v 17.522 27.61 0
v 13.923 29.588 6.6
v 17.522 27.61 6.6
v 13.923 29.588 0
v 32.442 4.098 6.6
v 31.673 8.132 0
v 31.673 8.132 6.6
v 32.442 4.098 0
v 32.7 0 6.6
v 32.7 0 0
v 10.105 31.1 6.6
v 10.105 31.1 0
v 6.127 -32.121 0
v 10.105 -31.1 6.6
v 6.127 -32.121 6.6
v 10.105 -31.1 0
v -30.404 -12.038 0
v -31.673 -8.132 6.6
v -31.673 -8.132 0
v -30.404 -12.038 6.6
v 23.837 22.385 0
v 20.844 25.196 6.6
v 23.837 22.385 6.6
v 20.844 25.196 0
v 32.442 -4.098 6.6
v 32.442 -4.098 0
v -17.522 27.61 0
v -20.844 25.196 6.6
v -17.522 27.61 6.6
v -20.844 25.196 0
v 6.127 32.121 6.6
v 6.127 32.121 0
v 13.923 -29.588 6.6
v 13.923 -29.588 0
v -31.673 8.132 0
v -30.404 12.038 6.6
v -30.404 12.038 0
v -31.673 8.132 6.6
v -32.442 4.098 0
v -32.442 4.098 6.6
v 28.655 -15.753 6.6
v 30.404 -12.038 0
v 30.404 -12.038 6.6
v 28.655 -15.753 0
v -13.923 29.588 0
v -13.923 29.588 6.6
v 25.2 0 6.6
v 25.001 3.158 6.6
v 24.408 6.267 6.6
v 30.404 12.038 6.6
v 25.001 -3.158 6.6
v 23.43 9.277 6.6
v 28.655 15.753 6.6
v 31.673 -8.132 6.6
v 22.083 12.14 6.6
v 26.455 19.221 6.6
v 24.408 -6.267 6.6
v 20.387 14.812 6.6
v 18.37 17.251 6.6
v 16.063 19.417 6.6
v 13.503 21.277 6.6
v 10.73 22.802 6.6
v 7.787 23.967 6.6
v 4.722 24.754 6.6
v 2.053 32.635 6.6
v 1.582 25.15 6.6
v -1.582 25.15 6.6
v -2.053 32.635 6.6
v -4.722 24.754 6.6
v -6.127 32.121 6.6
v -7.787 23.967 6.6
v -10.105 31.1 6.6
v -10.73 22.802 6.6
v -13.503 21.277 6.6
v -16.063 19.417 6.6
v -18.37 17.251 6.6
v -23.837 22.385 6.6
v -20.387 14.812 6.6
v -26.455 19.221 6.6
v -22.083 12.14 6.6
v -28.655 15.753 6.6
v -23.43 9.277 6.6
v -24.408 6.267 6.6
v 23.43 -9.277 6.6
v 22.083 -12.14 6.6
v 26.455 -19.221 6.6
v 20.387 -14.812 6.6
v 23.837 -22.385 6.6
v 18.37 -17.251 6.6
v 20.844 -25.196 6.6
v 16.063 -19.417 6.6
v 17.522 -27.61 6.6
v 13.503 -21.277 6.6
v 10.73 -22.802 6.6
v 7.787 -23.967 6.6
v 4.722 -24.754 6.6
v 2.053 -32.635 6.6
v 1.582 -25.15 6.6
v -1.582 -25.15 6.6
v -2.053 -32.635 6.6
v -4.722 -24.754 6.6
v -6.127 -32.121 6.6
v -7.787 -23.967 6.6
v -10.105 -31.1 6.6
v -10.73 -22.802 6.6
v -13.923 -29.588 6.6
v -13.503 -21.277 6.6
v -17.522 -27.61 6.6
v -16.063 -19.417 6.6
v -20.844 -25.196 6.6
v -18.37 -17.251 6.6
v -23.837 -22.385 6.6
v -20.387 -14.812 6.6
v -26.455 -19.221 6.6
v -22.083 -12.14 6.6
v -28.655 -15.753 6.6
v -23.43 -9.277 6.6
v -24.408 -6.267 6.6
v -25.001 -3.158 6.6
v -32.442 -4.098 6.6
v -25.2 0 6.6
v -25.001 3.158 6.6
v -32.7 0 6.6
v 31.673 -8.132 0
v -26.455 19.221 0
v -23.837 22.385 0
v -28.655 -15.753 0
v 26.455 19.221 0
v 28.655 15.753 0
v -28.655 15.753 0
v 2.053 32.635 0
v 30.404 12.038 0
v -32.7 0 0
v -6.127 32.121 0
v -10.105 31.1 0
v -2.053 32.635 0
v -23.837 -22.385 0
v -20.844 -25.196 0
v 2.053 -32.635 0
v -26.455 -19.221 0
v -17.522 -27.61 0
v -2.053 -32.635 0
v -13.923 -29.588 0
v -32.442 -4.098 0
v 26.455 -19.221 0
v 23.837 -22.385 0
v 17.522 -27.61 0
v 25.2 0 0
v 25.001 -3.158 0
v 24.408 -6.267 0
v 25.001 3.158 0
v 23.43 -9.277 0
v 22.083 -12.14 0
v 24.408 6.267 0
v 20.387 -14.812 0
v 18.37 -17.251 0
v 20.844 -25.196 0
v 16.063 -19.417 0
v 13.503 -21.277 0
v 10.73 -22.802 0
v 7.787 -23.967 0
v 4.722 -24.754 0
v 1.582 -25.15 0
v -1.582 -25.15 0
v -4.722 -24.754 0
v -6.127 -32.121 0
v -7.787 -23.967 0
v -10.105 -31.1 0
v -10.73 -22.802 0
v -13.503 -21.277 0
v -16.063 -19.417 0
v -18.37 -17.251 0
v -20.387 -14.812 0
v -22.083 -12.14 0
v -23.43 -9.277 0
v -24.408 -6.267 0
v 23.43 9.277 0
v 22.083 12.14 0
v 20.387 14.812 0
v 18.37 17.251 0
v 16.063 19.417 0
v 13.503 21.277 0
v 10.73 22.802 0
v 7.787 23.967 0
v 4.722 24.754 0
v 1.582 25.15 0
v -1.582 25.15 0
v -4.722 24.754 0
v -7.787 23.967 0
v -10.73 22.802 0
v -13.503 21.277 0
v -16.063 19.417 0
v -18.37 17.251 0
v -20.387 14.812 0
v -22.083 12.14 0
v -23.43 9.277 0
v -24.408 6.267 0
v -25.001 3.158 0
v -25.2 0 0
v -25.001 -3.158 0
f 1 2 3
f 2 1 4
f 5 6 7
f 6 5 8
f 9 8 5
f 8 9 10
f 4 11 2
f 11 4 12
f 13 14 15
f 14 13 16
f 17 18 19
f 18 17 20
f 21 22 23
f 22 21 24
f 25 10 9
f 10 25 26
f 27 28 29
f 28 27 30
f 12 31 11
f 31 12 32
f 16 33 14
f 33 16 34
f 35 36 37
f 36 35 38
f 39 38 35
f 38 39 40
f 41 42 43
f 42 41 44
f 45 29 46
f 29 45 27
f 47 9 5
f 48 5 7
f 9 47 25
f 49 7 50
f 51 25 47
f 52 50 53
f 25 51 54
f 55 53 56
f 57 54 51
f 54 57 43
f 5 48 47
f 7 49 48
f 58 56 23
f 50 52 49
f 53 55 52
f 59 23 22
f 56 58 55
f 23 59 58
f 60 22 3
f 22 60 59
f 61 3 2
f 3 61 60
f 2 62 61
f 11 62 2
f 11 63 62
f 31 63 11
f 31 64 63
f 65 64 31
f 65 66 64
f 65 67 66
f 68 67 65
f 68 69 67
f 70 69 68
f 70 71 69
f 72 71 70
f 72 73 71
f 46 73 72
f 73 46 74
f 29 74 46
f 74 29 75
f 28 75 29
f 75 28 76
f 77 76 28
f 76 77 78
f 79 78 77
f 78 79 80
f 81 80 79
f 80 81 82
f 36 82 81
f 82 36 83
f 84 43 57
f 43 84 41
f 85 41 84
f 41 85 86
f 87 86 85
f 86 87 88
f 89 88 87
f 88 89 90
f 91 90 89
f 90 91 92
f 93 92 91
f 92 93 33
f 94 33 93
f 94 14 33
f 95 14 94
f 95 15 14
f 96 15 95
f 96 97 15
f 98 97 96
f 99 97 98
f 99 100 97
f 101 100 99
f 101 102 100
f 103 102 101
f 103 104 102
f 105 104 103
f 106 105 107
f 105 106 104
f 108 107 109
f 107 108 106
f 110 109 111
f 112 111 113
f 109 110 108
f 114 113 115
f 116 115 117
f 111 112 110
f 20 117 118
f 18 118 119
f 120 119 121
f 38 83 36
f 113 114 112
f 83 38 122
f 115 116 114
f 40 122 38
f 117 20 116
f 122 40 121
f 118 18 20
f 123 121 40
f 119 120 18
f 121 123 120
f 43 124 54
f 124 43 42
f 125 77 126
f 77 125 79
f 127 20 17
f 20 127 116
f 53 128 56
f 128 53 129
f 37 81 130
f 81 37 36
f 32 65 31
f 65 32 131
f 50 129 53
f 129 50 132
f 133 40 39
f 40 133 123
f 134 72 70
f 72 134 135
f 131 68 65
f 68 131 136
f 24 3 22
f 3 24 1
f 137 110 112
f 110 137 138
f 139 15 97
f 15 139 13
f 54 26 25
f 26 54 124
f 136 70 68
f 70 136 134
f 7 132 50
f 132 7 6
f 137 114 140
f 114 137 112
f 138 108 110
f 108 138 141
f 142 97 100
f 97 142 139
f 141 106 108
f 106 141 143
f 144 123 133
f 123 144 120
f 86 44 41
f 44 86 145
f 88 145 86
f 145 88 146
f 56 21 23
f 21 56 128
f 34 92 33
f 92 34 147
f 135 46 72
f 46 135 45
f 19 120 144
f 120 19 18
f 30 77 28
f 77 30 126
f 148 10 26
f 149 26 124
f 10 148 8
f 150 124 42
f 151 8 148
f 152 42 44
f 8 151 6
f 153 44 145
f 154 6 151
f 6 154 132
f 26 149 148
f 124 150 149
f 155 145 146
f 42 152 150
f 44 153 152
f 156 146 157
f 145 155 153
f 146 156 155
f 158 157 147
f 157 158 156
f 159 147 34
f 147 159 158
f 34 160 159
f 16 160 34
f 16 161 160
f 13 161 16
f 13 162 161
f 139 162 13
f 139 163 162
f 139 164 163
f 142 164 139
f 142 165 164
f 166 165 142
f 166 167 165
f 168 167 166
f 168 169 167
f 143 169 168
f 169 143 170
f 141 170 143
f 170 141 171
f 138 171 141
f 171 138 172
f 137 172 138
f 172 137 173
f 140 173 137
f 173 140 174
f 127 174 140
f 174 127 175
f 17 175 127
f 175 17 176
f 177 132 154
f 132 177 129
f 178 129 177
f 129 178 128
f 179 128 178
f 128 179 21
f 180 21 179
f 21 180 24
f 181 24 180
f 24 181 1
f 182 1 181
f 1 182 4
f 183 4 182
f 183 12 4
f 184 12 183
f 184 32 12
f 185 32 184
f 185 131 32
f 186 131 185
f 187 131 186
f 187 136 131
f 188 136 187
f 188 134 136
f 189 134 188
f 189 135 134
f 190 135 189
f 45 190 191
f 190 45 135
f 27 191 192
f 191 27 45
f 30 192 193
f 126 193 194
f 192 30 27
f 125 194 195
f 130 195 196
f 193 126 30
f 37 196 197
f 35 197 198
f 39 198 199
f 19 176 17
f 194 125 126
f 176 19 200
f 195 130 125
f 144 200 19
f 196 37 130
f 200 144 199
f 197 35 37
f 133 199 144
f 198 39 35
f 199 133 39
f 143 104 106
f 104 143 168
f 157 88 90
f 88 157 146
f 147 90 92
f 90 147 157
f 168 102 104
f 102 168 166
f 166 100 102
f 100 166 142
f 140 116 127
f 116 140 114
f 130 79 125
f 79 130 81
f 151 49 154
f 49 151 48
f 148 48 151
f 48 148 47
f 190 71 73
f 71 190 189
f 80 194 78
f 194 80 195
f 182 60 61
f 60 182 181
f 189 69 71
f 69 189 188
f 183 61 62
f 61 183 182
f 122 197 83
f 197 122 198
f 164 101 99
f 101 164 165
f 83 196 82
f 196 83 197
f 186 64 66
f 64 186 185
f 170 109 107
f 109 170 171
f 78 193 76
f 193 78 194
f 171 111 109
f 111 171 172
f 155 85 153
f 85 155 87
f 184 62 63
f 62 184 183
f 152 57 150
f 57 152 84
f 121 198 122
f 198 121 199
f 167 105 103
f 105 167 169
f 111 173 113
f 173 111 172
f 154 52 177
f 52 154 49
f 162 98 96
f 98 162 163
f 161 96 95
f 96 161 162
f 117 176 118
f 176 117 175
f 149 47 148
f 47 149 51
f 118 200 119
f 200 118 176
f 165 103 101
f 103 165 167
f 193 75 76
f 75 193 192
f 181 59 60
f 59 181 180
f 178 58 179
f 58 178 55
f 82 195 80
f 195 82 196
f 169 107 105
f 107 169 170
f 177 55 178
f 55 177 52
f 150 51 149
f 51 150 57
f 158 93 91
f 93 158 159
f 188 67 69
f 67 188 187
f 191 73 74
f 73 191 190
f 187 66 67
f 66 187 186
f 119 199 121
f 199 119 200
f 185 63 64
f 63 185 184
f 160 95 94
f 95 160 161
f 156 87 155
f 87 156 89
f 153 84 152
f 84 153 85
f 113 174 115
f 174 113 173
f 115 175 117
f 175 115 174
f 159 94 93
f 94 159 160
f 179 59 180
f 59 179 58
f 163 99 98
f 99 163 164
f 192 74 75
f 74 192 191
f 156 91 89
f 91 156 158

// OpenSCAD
$fn = 50;


difference() {
	union() {
		cylinder(h = 6.6000000000, r = 32.7000000000);
	}
	union() {
		cylinder(h = 6.6000000000, r = 25.2000000000);
	}
}
